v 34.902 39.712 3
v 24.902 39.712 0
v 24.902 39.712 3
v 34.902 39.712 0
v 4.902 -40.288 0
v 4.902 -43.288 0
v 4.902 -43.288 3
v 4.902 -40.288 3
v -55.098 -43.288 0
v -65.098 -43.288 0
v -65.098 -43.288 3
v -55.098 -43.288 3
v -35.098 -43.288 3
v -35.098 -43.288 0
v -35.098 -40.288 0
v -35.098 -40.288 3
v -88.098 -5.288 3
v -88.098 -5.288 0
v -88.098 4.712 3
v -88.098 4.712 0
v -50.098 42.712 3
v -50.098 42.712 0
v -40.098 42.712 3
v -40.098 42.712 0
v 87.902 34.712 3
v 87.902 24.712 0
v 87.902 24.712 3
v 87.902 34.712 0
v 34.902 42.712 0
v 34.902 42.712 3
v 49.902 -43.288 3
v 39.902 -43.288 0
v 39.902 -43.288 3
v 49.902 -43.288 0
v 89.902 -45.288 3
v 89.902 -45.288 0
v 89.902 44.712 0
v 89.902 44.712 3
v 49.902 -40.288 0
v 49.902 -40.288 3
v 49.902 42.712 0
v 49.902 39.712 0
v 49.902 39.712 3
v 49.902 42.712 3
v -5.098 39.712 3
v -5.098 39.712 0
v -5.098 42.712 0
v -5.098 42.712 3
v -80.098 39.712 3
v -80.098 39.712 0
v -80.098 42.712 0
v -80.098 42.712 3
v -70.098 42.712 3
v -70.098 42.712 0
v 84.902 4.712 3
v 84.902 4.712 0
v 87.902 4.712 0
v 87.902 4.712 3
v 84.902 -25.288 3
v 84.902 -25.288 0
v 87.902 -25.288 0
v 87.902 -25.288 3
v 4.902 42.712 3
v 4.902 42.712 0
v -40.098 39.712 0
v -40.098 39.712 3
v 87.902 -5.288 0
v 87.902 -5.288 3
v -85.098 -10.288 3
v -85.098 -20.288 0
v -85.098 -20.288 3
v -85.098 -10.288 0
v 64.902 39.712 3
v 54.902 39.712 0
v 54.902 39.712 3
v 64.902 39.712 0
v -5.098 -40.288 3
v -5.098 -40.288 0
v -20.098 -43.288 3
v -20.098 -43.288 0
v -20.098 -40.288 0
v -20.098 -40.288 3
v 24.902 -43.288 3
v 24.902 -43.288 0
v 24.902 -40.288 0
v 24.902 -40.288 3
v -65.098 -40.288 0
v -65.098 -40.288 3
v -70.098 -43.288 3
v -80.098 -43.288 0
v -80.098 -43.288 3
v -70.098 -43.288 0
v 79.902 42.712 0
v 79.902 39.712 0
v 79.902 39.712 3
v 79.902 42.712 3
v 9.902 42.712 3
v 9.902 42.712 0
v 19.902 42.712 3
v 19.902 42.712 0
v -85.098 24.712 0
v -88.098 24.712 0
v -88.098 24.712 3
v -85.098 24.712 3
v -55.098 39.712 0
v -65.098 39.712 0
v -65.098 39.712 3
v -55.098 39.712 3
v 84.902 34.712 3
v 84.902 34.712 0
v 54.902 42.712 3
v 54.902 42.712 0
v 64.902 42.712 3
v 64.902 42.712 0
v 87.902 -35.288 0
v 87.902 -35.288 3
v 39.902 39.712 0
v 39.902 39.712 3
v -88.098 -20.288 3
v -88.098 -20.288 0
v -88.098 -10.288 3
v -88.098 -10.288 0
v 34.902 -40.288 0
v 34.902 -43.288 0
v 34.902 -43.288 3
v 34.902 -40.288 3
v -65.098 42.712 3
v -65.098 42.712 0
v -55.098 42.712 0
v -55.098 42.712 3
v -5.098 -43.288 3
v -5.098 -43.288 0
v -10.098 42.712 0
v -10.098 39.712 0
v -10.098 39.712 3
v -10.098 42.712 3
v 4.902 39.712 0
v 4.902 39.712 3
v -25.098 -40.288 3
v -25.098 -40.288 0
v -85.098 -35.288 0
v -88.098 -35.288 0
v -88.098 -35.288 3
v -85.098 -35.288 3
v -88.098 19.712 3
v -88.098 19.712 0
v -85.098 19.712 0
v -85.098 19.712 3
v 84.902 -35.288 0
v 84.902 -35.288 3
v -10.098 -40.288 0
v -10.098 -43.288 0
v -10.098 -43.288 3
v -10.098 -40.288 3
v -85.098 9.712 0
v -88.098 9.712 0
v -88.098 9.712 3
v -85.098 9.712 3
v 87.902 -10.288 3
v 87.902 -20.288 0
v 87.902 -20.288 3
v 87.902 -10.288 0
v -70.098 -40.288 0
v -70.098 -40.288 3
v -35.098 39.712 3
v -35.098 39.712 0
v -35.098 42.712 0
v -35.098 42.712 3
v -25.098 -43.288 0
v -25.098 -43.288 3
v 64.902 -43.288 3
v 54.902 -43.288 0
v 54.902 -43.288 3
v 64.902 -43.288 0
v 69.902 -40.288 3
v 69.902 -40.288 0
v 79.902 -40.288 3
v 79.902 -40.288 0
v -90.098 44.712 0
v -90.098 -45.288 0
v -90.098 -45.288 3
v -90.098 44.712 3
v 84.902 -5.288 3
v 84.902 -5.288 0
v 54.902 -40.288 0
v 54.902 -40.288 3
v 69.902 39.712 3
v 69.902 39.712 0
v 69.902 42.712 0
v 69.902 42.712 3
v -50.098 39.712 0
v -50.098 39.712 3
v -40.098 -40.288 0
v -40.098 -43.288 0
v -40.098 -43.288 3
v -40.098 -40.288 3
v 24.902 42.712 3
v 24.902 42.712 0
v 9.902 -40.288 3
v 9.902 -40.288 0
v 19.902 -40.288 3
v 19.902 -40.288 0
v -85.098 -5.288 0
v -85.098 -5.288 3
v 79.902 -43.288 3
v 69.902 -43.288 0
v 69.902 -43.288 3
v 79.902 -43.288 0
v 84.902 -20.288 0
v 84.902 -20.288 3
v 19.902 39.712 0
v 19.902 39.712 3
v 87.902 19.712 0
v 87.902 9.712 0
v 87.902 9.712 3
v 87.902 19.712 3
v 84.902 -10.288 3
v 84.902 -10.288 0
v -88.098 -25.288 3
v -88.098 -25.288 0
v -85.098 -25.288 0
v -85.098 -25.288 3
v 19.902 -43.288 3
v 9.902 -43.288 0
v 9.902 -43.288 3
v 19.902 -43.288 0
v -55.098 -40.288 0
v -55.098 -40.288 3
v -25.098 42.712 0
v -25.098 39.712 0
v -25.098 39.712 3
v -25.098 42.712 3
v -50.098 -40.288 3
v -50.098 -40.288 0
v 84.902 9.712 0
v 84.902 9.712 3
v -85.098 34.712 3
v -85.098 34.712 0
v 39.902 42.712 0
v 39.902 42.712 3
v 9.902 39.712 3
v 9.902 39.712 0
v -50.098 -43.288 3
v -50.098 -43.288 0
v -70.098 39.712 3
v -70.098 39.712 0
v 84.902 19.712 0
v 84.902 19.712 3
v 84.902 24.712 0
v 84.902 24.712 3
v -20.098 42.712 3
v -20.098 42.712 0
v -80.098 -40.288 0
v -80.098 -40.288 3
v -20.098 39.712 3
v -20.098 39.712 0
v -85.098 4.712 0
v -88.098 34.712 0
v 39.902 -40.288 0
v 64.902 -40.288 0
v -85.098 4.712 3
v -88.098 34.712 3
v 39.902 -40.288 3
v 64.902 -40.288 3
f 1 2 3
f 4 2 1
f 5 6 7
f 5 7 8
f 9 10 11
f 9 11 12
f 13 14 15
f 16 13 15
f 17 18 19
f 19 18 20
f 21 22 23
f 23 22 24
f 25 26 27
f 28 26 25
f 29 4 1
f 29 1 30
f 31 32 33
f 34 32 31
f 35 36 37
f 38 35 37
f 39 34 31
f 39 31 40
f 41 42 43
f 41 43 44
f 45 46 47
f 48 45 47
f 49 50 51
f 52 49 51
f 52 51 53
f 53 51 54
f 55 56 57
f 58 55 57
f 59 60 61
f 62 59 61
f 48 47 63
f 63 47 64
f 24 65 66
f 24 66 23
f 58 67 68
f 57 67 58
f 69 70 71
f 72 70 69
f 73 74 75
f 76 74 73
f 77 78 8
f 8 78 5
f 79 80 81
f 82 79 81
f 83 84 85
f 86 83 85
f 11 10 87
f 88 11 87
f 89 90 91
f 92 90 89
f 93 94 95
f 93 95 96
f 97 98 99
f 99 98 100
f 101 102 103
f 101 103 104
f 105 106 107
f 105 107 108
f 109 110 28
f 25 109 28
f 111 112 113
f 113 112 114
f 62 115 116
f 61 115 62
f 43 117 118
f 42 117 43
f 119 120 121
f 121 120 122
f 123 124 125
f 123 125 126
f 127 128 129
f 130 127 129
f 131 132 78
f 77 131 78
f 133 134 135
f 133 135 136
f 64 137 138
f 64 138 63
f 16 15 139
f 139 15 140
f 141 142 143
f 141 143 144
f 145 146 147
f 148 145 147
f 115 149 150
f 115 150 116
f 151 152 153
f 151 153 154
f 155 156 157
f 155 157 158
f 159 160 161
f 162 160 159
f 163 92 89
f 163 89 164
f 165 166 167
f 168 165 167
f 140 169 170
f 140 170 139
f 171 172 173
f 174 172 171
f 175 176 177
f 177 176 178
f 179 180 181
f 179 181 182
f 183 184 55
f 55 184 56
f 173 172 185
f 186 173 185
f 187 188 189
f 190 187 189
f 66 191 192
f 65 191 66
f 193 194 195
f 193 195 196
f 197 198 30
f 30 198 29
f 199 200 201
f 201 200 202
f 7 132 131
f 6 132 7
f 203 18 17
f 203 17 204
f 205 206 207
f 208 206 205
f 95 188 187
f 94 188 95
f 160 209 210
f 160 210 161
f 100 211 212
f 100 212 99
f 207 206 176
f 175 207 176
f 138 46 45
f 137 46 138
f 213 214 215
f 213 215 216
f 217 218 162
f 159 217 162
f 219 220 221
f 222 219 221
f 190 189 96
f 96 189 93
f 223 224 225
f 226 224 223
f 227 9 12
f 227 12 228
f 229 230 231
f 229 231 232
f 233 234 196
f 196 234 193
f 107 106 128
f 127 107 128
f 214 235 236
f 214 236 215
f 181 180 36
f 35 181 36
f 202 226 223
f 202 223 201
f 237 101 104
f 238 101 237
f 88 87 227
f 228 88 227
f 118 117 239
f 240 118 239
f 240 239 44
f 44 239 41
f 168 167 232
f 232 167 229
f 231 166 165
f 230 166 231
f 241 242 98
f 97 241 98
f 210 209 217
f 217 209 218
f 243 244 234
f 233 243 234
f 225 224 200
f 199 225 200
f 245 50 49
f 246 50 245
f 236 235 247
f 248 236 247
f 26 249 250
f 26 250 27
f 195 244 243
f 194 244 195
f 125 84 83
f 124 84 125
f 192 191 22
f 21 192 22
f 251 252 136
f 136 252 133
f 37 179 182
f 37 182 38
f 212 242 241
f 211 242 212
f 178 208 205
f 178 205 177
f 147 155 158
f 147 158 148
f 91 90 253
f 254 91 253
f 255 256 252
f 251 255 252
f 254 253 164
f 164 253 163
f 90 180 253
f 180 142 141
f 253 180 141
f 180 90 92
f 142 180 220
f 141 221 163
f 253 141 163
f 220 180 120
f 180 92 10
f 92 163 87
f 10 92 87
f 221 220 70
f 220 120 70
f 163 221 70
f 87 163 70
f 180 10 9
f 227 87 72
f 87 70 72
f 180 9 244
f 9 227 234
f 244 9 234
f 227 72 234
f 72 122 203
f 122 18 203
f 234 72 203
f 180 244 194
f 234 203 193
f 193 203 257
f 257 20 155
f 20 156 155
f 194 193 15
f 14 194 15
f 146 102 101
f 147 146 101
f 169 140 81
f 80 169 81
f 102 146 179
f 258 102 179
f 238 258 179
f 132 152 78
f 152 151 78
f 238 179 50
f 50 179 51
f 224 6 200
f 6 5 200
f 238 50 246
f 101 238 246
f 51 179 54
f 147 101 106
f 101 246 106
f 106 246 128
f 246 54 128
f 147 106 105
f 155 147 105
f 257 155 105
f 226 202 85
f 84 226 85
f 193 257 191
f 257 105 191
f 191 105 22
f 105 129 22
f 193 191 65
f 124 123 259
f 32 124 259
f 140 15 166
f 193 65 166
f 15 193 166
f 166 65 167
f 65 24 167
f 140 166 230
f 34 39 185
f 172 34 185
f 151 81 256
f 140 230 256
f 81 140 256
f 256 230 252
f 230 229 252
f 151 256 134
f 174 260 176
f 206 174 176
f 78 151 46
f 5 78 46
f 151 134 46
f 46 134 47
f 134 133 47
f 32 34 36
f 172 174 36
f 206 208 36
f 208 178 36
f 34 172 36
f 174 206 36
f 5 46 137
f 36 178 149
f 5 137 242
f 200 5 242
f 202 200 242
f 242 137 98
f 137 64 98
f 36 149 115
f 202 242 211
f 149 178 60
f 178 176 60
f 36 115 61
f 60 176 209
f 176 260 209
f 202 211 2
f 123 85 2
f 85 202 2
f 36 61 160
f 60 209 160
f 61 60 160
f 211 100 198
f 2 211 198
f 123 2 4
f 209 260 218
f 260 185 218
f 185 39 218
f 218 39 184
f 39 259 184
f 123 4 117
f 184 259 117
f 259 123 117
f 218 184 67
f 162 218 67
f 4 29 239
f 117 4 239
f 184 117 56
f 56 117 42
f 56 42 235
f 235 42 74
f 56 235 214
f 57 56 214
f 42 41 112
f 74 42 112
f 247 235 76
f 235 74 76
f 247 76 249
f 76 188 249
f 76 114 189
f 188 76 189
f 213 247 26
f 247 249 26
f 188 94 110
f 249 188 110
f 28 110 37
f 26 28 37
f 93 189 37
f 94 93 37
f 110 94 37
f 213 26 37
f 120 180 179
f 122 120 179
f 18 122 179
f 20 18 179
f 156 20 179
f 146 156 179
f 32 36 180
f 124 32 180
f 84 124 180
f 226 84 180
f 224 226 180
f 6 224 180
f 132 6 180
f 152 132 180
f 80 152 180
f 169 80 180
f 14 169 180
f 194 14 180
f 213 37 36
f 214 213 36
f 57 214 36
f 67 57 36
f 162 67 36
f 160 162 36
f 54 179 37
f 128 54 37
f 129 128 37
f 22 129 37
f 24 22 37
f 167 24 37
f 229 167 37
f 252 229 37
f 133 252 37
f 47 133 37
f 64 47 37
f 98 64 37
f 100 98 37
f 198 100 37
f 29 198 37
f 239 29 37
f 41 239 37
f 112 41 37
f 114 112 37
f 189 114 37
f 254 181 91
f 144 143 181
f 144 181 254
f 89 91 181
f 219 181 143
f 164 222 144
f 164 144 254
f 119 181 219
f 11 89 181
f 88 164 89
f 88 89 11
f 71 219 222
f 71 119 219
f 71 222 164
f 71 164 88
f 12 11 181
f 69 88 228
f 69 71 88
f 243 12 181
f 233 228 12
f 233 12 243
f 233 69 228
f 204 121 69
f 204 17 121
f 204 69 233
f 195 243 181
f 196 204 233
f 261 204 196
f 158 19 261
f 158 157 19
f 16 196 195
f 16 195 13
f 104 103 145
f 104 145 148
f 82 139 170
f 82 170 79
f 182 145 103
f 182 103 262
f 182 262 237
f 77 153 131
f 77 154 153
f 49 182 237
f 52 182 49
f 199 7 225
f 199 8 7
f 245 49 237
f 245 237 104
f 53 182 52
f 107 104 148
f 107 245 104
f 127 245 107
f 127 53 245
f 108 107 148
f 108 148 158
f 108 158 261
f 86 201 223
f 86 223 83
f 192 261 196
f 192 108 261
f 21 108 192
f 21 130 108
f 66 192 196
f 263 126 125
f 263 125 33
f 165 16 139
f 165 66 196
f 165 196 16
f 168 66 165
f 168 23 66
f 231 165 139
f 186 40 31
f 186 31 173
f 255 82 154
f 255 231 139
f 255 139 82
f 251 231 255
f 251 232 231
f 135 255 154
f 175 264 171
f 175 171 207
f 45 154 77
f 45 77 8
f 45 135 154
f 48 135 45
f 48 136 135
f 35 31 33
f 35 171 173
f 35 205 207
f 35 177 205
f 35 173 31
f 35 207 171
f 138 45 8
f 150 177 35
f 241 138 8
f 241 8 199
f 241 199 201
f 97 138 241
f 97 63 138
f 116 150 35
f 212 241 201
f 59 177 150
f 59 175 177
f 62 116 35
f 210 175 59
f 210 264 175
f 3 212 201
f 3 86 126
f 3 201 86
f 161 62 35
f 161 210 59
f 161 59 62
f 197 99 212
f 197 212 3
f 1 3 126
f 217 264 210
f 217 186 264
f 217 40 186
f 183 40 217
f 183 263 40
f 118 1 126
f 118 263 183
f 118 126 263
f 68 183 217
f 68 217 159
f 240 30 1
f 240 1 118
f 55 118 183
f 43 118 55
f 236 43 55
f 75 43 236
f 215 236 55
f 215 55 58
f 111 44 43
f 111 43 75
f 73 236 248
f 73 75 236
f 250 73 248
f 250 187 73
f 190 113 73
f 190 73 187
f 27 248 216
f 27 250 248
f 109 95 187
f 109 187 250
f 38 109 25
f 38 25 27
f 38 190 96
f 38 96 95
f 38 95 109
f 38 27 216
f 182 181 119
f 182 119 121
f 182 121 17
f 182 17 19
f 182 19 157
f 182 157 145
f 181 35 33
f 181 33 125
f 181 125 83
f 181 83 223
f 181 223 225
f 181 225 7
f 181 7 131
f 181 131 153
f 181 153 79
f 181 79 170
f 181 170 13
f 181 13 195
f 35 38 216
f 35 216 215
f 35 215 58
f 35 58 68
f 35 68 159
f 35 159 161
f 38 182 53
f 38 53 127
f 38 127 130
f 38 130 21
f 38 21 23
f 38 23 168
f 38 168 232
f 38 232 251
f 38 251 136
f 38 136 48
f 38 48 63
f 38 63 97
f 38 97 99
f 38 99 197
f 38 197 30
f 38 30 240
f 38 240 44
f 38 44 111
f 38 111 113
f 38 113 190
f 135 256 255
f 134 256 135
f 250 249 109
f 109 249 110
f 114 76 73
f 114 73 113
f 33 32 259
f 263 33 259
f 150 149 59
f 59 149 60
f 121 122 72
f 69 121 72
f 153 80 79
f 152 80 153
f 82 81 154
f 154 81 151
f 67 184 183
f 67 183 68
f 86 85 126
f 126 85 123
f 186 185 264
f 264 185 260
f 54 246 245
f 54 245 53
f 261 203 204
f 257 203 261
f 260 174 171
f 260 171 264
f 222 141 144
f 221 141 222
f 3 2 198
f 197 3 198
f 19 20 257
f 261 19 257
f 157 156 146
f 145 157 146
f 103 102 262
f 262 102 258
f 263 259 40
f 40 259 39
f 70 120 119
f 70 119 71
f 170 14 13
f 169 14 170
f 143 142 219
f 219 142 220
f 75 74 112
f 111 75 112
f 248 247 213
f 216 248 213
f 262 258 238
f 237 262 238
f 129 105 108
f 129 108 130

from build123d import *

# Parameters (mm, degrees)
SKETCH_1_W      = 180
SKETCH_1_H      = 90
SKETCH_1_W_2    = 10
SKETCH_1_H_2    = 3
SKETCH_1_W_3    = 3
SKETCH_1_H_3    = 10
EXTRUDE_1_DEPTH = 3


with BuildPart() as part:
    # 草图1 → 凸台-拉伸1 (new body)
    with BuildSketch(Plane.XY):
        with Locations((-0.098158541, -0.288232222)):
            Rectangle(SKETCH_1_W, SKETCH_1_H)
        with Locations((-75.098158541, 41.211767778)):
            Rectangle(SKETCH_1_W_2, SKETCH_1_H_2, mode=Mode.SUBTRACT)
        with Locations((-86.598158541, 29.711767778)):
            Rectangle(SKETCH_1_W_3, SKETCH_1_H_3, mode=Mode.SUBTRACT)
        with Locations((-86.598158541, 14.711767778)):
            Rectangle(SKETCH_1_W_3, SKETCH_1_H_3, mode=Mode.SUBTRACT)
        with Locations((-86.598158541, -0.288232222)):
            Rectangle(SKETCH_1_W_3, SKETCH_1_H_3, mode=Mode.SUBTRACT)
        with Locations((-86.598158541, -15.288232222)):
            Rectangle(SKETCH_1_W_3, SKETCH_1_H_3, mode=Mode.SUBTRACT)
        with Locations((-86.598158541, -30.288232222)):
            Rectangle(SKETCH_1_W_3, SKETCH_1_H_3, mode=Mode.SUBTRACT)
        with Locations((86.401841459, -30.288232222)):
            Rectangle(SKETCH_1_W_3, SKETCH_1_H_3, mode=Mode.SUBTRACT)
        with Locations((86.401841459, -15.288232222)):
            Rectangle(SKETCH_1_W_3, SKETCH_1_H_3, mode=Mode.SUBTRACT)
        with Locations((86.401841459, -0.288232222)):
            Rectangle(SKETCH_1_W_3, SKETCH_1_H_3, mode=Mode.SUBTRACT)
        with Locations((86.401841459, 14.711767778)):
            Rectangle(SKETCH_1_W_3, SKETCH_1_H_3, mode=Mode.SUBTRACT)
        with Locations((86.401841459, 29.711767778)):
            Rectangle(SKETCH_1_W_3, SKETCH_1_H_3, mode=Mode.SUBTRACT)
        with Locations((-60.098158541, 41.211767778)):
            Rectangle(SKETCH_1_W_2, SKETCH_1_H_2, mode=Mode.SUBTRACT)
        with Locations((-45.098158541, 41.211767778)):
            Rectangle(SKETCH_1_W_2, SKETCH_1_H_2, mode=Mode.SUBTRACT)
        with Locations((-30.098158541, 41.211767778)):
            Rectangle(SKETCH_1_W_2, SKETCH_1_H_2, mode=Mode.SUBTRACT)
        with Locations((-15.098158541, 41.211767778)):
            Rectangle(SKETCH_1_W_2, SKETCH_1_H_2, mode=Mode.SUBTRACT)
        with Locations((-0.098158541, 41.211767778)):
            Rectangle(SKETCH_1_W_2, SKETCH_1_H_2, mode=Mode.SUBTRACT)
        with Locations((14.901841459, 41.211767778)):
            Rectangle(SKETCH_1_W_2, SKETCH_1_H_2, mode=Mode.SUBTRACT)
        with Locations((29.901841459, 41.211767778)):
            Rectangle(SKETCH_1_W_2, SKETCH_1_H_2, mode=Mode.SUBTRACT)
        with Locations((44.901841459, 41.211767778)):
            Rectangle(SKETCH_1_W_2, SKETCH_1_H_2, mode=Mode.SUBTRACT)
        with Locations((59.901841459, 41.211767778)):
            Rectangle(SKETCH_1_W_2, SKETCH_1_H_2, mode=Mode.SUBTRACT)
        with Locations((74.901841459, 41.211767778)):
            Rectangle(SKETCH_1_W_2, SKETCH_1_H_2, mode=Mode.SUBTRACT)
        with Locations((74.901841459, -41.788232222)):
            Rectangle(SKETCH_1_W_2, SKETCH_1_H_2, mode=Mode.SUBTRACT)
        with Locations((59.901841459, -41.788232222)):
            Rectangle(SKETCH_1_W_2, SKETCH_1_H_2, mode=Mode.SUBTRACT)
        with Locations((44.901841459, -41.788232222)):
            Rectangle(SKETCH_1_W_2, SKETCH_1_H_2, mode=Mode.SUBTRACT)
        with Locations((29.901841459, -41.788232222)):
            Rectangle(SKETCH_1_W_2, SKETCH_1_H_2, mode=Mode.SUBTRACT)
        with Locations((14.901841459, -41.788232222)):
            Rectangle(SKETCH_1_W_2, SKETCH_1_H_2, mode=Mode.SUBTRACT)
        with Locations((-0.098158541, -41.788232222)):
            Rectangle(SKETCH_1_W_2, SKETCH_1_H_2, mode=Mode.SUBTRACT)
        with Locations((-15.098158541, -41.788232222)):
            Rectangle(SKETCH_1_W_2, SKETCH_1_H_2, mode=Mode.SUBTRACT)
        with Locations((-30.098158541, -41.788232222)):
            Rectangle(SKETCH_1_W_2, SKETCH_1_H_2, mode=Mode.SUBTRACT)
        with Locations((-45.098158541, -41.788232222)):
            Rectangle(SKETCH_1_W_2, SKETCH_1_H_2, mode=Mode.SUBTRACT)
        with Locations((-60.098158541, -41.788232222)):
            Rectangle(SKETCH_1_W_2, SKETCH_1_H_2, mode=Mode.SUBTRACT)
        with Locations((-75.098158541, -41.788232222)):
            Rectangle(SKETCH_1_W_2, SKETCH_1_H_2, mode=Mode.SUBTRACT)
    extrude(amount=EXTRUDE_1_DEPTH)


solid = part.part
